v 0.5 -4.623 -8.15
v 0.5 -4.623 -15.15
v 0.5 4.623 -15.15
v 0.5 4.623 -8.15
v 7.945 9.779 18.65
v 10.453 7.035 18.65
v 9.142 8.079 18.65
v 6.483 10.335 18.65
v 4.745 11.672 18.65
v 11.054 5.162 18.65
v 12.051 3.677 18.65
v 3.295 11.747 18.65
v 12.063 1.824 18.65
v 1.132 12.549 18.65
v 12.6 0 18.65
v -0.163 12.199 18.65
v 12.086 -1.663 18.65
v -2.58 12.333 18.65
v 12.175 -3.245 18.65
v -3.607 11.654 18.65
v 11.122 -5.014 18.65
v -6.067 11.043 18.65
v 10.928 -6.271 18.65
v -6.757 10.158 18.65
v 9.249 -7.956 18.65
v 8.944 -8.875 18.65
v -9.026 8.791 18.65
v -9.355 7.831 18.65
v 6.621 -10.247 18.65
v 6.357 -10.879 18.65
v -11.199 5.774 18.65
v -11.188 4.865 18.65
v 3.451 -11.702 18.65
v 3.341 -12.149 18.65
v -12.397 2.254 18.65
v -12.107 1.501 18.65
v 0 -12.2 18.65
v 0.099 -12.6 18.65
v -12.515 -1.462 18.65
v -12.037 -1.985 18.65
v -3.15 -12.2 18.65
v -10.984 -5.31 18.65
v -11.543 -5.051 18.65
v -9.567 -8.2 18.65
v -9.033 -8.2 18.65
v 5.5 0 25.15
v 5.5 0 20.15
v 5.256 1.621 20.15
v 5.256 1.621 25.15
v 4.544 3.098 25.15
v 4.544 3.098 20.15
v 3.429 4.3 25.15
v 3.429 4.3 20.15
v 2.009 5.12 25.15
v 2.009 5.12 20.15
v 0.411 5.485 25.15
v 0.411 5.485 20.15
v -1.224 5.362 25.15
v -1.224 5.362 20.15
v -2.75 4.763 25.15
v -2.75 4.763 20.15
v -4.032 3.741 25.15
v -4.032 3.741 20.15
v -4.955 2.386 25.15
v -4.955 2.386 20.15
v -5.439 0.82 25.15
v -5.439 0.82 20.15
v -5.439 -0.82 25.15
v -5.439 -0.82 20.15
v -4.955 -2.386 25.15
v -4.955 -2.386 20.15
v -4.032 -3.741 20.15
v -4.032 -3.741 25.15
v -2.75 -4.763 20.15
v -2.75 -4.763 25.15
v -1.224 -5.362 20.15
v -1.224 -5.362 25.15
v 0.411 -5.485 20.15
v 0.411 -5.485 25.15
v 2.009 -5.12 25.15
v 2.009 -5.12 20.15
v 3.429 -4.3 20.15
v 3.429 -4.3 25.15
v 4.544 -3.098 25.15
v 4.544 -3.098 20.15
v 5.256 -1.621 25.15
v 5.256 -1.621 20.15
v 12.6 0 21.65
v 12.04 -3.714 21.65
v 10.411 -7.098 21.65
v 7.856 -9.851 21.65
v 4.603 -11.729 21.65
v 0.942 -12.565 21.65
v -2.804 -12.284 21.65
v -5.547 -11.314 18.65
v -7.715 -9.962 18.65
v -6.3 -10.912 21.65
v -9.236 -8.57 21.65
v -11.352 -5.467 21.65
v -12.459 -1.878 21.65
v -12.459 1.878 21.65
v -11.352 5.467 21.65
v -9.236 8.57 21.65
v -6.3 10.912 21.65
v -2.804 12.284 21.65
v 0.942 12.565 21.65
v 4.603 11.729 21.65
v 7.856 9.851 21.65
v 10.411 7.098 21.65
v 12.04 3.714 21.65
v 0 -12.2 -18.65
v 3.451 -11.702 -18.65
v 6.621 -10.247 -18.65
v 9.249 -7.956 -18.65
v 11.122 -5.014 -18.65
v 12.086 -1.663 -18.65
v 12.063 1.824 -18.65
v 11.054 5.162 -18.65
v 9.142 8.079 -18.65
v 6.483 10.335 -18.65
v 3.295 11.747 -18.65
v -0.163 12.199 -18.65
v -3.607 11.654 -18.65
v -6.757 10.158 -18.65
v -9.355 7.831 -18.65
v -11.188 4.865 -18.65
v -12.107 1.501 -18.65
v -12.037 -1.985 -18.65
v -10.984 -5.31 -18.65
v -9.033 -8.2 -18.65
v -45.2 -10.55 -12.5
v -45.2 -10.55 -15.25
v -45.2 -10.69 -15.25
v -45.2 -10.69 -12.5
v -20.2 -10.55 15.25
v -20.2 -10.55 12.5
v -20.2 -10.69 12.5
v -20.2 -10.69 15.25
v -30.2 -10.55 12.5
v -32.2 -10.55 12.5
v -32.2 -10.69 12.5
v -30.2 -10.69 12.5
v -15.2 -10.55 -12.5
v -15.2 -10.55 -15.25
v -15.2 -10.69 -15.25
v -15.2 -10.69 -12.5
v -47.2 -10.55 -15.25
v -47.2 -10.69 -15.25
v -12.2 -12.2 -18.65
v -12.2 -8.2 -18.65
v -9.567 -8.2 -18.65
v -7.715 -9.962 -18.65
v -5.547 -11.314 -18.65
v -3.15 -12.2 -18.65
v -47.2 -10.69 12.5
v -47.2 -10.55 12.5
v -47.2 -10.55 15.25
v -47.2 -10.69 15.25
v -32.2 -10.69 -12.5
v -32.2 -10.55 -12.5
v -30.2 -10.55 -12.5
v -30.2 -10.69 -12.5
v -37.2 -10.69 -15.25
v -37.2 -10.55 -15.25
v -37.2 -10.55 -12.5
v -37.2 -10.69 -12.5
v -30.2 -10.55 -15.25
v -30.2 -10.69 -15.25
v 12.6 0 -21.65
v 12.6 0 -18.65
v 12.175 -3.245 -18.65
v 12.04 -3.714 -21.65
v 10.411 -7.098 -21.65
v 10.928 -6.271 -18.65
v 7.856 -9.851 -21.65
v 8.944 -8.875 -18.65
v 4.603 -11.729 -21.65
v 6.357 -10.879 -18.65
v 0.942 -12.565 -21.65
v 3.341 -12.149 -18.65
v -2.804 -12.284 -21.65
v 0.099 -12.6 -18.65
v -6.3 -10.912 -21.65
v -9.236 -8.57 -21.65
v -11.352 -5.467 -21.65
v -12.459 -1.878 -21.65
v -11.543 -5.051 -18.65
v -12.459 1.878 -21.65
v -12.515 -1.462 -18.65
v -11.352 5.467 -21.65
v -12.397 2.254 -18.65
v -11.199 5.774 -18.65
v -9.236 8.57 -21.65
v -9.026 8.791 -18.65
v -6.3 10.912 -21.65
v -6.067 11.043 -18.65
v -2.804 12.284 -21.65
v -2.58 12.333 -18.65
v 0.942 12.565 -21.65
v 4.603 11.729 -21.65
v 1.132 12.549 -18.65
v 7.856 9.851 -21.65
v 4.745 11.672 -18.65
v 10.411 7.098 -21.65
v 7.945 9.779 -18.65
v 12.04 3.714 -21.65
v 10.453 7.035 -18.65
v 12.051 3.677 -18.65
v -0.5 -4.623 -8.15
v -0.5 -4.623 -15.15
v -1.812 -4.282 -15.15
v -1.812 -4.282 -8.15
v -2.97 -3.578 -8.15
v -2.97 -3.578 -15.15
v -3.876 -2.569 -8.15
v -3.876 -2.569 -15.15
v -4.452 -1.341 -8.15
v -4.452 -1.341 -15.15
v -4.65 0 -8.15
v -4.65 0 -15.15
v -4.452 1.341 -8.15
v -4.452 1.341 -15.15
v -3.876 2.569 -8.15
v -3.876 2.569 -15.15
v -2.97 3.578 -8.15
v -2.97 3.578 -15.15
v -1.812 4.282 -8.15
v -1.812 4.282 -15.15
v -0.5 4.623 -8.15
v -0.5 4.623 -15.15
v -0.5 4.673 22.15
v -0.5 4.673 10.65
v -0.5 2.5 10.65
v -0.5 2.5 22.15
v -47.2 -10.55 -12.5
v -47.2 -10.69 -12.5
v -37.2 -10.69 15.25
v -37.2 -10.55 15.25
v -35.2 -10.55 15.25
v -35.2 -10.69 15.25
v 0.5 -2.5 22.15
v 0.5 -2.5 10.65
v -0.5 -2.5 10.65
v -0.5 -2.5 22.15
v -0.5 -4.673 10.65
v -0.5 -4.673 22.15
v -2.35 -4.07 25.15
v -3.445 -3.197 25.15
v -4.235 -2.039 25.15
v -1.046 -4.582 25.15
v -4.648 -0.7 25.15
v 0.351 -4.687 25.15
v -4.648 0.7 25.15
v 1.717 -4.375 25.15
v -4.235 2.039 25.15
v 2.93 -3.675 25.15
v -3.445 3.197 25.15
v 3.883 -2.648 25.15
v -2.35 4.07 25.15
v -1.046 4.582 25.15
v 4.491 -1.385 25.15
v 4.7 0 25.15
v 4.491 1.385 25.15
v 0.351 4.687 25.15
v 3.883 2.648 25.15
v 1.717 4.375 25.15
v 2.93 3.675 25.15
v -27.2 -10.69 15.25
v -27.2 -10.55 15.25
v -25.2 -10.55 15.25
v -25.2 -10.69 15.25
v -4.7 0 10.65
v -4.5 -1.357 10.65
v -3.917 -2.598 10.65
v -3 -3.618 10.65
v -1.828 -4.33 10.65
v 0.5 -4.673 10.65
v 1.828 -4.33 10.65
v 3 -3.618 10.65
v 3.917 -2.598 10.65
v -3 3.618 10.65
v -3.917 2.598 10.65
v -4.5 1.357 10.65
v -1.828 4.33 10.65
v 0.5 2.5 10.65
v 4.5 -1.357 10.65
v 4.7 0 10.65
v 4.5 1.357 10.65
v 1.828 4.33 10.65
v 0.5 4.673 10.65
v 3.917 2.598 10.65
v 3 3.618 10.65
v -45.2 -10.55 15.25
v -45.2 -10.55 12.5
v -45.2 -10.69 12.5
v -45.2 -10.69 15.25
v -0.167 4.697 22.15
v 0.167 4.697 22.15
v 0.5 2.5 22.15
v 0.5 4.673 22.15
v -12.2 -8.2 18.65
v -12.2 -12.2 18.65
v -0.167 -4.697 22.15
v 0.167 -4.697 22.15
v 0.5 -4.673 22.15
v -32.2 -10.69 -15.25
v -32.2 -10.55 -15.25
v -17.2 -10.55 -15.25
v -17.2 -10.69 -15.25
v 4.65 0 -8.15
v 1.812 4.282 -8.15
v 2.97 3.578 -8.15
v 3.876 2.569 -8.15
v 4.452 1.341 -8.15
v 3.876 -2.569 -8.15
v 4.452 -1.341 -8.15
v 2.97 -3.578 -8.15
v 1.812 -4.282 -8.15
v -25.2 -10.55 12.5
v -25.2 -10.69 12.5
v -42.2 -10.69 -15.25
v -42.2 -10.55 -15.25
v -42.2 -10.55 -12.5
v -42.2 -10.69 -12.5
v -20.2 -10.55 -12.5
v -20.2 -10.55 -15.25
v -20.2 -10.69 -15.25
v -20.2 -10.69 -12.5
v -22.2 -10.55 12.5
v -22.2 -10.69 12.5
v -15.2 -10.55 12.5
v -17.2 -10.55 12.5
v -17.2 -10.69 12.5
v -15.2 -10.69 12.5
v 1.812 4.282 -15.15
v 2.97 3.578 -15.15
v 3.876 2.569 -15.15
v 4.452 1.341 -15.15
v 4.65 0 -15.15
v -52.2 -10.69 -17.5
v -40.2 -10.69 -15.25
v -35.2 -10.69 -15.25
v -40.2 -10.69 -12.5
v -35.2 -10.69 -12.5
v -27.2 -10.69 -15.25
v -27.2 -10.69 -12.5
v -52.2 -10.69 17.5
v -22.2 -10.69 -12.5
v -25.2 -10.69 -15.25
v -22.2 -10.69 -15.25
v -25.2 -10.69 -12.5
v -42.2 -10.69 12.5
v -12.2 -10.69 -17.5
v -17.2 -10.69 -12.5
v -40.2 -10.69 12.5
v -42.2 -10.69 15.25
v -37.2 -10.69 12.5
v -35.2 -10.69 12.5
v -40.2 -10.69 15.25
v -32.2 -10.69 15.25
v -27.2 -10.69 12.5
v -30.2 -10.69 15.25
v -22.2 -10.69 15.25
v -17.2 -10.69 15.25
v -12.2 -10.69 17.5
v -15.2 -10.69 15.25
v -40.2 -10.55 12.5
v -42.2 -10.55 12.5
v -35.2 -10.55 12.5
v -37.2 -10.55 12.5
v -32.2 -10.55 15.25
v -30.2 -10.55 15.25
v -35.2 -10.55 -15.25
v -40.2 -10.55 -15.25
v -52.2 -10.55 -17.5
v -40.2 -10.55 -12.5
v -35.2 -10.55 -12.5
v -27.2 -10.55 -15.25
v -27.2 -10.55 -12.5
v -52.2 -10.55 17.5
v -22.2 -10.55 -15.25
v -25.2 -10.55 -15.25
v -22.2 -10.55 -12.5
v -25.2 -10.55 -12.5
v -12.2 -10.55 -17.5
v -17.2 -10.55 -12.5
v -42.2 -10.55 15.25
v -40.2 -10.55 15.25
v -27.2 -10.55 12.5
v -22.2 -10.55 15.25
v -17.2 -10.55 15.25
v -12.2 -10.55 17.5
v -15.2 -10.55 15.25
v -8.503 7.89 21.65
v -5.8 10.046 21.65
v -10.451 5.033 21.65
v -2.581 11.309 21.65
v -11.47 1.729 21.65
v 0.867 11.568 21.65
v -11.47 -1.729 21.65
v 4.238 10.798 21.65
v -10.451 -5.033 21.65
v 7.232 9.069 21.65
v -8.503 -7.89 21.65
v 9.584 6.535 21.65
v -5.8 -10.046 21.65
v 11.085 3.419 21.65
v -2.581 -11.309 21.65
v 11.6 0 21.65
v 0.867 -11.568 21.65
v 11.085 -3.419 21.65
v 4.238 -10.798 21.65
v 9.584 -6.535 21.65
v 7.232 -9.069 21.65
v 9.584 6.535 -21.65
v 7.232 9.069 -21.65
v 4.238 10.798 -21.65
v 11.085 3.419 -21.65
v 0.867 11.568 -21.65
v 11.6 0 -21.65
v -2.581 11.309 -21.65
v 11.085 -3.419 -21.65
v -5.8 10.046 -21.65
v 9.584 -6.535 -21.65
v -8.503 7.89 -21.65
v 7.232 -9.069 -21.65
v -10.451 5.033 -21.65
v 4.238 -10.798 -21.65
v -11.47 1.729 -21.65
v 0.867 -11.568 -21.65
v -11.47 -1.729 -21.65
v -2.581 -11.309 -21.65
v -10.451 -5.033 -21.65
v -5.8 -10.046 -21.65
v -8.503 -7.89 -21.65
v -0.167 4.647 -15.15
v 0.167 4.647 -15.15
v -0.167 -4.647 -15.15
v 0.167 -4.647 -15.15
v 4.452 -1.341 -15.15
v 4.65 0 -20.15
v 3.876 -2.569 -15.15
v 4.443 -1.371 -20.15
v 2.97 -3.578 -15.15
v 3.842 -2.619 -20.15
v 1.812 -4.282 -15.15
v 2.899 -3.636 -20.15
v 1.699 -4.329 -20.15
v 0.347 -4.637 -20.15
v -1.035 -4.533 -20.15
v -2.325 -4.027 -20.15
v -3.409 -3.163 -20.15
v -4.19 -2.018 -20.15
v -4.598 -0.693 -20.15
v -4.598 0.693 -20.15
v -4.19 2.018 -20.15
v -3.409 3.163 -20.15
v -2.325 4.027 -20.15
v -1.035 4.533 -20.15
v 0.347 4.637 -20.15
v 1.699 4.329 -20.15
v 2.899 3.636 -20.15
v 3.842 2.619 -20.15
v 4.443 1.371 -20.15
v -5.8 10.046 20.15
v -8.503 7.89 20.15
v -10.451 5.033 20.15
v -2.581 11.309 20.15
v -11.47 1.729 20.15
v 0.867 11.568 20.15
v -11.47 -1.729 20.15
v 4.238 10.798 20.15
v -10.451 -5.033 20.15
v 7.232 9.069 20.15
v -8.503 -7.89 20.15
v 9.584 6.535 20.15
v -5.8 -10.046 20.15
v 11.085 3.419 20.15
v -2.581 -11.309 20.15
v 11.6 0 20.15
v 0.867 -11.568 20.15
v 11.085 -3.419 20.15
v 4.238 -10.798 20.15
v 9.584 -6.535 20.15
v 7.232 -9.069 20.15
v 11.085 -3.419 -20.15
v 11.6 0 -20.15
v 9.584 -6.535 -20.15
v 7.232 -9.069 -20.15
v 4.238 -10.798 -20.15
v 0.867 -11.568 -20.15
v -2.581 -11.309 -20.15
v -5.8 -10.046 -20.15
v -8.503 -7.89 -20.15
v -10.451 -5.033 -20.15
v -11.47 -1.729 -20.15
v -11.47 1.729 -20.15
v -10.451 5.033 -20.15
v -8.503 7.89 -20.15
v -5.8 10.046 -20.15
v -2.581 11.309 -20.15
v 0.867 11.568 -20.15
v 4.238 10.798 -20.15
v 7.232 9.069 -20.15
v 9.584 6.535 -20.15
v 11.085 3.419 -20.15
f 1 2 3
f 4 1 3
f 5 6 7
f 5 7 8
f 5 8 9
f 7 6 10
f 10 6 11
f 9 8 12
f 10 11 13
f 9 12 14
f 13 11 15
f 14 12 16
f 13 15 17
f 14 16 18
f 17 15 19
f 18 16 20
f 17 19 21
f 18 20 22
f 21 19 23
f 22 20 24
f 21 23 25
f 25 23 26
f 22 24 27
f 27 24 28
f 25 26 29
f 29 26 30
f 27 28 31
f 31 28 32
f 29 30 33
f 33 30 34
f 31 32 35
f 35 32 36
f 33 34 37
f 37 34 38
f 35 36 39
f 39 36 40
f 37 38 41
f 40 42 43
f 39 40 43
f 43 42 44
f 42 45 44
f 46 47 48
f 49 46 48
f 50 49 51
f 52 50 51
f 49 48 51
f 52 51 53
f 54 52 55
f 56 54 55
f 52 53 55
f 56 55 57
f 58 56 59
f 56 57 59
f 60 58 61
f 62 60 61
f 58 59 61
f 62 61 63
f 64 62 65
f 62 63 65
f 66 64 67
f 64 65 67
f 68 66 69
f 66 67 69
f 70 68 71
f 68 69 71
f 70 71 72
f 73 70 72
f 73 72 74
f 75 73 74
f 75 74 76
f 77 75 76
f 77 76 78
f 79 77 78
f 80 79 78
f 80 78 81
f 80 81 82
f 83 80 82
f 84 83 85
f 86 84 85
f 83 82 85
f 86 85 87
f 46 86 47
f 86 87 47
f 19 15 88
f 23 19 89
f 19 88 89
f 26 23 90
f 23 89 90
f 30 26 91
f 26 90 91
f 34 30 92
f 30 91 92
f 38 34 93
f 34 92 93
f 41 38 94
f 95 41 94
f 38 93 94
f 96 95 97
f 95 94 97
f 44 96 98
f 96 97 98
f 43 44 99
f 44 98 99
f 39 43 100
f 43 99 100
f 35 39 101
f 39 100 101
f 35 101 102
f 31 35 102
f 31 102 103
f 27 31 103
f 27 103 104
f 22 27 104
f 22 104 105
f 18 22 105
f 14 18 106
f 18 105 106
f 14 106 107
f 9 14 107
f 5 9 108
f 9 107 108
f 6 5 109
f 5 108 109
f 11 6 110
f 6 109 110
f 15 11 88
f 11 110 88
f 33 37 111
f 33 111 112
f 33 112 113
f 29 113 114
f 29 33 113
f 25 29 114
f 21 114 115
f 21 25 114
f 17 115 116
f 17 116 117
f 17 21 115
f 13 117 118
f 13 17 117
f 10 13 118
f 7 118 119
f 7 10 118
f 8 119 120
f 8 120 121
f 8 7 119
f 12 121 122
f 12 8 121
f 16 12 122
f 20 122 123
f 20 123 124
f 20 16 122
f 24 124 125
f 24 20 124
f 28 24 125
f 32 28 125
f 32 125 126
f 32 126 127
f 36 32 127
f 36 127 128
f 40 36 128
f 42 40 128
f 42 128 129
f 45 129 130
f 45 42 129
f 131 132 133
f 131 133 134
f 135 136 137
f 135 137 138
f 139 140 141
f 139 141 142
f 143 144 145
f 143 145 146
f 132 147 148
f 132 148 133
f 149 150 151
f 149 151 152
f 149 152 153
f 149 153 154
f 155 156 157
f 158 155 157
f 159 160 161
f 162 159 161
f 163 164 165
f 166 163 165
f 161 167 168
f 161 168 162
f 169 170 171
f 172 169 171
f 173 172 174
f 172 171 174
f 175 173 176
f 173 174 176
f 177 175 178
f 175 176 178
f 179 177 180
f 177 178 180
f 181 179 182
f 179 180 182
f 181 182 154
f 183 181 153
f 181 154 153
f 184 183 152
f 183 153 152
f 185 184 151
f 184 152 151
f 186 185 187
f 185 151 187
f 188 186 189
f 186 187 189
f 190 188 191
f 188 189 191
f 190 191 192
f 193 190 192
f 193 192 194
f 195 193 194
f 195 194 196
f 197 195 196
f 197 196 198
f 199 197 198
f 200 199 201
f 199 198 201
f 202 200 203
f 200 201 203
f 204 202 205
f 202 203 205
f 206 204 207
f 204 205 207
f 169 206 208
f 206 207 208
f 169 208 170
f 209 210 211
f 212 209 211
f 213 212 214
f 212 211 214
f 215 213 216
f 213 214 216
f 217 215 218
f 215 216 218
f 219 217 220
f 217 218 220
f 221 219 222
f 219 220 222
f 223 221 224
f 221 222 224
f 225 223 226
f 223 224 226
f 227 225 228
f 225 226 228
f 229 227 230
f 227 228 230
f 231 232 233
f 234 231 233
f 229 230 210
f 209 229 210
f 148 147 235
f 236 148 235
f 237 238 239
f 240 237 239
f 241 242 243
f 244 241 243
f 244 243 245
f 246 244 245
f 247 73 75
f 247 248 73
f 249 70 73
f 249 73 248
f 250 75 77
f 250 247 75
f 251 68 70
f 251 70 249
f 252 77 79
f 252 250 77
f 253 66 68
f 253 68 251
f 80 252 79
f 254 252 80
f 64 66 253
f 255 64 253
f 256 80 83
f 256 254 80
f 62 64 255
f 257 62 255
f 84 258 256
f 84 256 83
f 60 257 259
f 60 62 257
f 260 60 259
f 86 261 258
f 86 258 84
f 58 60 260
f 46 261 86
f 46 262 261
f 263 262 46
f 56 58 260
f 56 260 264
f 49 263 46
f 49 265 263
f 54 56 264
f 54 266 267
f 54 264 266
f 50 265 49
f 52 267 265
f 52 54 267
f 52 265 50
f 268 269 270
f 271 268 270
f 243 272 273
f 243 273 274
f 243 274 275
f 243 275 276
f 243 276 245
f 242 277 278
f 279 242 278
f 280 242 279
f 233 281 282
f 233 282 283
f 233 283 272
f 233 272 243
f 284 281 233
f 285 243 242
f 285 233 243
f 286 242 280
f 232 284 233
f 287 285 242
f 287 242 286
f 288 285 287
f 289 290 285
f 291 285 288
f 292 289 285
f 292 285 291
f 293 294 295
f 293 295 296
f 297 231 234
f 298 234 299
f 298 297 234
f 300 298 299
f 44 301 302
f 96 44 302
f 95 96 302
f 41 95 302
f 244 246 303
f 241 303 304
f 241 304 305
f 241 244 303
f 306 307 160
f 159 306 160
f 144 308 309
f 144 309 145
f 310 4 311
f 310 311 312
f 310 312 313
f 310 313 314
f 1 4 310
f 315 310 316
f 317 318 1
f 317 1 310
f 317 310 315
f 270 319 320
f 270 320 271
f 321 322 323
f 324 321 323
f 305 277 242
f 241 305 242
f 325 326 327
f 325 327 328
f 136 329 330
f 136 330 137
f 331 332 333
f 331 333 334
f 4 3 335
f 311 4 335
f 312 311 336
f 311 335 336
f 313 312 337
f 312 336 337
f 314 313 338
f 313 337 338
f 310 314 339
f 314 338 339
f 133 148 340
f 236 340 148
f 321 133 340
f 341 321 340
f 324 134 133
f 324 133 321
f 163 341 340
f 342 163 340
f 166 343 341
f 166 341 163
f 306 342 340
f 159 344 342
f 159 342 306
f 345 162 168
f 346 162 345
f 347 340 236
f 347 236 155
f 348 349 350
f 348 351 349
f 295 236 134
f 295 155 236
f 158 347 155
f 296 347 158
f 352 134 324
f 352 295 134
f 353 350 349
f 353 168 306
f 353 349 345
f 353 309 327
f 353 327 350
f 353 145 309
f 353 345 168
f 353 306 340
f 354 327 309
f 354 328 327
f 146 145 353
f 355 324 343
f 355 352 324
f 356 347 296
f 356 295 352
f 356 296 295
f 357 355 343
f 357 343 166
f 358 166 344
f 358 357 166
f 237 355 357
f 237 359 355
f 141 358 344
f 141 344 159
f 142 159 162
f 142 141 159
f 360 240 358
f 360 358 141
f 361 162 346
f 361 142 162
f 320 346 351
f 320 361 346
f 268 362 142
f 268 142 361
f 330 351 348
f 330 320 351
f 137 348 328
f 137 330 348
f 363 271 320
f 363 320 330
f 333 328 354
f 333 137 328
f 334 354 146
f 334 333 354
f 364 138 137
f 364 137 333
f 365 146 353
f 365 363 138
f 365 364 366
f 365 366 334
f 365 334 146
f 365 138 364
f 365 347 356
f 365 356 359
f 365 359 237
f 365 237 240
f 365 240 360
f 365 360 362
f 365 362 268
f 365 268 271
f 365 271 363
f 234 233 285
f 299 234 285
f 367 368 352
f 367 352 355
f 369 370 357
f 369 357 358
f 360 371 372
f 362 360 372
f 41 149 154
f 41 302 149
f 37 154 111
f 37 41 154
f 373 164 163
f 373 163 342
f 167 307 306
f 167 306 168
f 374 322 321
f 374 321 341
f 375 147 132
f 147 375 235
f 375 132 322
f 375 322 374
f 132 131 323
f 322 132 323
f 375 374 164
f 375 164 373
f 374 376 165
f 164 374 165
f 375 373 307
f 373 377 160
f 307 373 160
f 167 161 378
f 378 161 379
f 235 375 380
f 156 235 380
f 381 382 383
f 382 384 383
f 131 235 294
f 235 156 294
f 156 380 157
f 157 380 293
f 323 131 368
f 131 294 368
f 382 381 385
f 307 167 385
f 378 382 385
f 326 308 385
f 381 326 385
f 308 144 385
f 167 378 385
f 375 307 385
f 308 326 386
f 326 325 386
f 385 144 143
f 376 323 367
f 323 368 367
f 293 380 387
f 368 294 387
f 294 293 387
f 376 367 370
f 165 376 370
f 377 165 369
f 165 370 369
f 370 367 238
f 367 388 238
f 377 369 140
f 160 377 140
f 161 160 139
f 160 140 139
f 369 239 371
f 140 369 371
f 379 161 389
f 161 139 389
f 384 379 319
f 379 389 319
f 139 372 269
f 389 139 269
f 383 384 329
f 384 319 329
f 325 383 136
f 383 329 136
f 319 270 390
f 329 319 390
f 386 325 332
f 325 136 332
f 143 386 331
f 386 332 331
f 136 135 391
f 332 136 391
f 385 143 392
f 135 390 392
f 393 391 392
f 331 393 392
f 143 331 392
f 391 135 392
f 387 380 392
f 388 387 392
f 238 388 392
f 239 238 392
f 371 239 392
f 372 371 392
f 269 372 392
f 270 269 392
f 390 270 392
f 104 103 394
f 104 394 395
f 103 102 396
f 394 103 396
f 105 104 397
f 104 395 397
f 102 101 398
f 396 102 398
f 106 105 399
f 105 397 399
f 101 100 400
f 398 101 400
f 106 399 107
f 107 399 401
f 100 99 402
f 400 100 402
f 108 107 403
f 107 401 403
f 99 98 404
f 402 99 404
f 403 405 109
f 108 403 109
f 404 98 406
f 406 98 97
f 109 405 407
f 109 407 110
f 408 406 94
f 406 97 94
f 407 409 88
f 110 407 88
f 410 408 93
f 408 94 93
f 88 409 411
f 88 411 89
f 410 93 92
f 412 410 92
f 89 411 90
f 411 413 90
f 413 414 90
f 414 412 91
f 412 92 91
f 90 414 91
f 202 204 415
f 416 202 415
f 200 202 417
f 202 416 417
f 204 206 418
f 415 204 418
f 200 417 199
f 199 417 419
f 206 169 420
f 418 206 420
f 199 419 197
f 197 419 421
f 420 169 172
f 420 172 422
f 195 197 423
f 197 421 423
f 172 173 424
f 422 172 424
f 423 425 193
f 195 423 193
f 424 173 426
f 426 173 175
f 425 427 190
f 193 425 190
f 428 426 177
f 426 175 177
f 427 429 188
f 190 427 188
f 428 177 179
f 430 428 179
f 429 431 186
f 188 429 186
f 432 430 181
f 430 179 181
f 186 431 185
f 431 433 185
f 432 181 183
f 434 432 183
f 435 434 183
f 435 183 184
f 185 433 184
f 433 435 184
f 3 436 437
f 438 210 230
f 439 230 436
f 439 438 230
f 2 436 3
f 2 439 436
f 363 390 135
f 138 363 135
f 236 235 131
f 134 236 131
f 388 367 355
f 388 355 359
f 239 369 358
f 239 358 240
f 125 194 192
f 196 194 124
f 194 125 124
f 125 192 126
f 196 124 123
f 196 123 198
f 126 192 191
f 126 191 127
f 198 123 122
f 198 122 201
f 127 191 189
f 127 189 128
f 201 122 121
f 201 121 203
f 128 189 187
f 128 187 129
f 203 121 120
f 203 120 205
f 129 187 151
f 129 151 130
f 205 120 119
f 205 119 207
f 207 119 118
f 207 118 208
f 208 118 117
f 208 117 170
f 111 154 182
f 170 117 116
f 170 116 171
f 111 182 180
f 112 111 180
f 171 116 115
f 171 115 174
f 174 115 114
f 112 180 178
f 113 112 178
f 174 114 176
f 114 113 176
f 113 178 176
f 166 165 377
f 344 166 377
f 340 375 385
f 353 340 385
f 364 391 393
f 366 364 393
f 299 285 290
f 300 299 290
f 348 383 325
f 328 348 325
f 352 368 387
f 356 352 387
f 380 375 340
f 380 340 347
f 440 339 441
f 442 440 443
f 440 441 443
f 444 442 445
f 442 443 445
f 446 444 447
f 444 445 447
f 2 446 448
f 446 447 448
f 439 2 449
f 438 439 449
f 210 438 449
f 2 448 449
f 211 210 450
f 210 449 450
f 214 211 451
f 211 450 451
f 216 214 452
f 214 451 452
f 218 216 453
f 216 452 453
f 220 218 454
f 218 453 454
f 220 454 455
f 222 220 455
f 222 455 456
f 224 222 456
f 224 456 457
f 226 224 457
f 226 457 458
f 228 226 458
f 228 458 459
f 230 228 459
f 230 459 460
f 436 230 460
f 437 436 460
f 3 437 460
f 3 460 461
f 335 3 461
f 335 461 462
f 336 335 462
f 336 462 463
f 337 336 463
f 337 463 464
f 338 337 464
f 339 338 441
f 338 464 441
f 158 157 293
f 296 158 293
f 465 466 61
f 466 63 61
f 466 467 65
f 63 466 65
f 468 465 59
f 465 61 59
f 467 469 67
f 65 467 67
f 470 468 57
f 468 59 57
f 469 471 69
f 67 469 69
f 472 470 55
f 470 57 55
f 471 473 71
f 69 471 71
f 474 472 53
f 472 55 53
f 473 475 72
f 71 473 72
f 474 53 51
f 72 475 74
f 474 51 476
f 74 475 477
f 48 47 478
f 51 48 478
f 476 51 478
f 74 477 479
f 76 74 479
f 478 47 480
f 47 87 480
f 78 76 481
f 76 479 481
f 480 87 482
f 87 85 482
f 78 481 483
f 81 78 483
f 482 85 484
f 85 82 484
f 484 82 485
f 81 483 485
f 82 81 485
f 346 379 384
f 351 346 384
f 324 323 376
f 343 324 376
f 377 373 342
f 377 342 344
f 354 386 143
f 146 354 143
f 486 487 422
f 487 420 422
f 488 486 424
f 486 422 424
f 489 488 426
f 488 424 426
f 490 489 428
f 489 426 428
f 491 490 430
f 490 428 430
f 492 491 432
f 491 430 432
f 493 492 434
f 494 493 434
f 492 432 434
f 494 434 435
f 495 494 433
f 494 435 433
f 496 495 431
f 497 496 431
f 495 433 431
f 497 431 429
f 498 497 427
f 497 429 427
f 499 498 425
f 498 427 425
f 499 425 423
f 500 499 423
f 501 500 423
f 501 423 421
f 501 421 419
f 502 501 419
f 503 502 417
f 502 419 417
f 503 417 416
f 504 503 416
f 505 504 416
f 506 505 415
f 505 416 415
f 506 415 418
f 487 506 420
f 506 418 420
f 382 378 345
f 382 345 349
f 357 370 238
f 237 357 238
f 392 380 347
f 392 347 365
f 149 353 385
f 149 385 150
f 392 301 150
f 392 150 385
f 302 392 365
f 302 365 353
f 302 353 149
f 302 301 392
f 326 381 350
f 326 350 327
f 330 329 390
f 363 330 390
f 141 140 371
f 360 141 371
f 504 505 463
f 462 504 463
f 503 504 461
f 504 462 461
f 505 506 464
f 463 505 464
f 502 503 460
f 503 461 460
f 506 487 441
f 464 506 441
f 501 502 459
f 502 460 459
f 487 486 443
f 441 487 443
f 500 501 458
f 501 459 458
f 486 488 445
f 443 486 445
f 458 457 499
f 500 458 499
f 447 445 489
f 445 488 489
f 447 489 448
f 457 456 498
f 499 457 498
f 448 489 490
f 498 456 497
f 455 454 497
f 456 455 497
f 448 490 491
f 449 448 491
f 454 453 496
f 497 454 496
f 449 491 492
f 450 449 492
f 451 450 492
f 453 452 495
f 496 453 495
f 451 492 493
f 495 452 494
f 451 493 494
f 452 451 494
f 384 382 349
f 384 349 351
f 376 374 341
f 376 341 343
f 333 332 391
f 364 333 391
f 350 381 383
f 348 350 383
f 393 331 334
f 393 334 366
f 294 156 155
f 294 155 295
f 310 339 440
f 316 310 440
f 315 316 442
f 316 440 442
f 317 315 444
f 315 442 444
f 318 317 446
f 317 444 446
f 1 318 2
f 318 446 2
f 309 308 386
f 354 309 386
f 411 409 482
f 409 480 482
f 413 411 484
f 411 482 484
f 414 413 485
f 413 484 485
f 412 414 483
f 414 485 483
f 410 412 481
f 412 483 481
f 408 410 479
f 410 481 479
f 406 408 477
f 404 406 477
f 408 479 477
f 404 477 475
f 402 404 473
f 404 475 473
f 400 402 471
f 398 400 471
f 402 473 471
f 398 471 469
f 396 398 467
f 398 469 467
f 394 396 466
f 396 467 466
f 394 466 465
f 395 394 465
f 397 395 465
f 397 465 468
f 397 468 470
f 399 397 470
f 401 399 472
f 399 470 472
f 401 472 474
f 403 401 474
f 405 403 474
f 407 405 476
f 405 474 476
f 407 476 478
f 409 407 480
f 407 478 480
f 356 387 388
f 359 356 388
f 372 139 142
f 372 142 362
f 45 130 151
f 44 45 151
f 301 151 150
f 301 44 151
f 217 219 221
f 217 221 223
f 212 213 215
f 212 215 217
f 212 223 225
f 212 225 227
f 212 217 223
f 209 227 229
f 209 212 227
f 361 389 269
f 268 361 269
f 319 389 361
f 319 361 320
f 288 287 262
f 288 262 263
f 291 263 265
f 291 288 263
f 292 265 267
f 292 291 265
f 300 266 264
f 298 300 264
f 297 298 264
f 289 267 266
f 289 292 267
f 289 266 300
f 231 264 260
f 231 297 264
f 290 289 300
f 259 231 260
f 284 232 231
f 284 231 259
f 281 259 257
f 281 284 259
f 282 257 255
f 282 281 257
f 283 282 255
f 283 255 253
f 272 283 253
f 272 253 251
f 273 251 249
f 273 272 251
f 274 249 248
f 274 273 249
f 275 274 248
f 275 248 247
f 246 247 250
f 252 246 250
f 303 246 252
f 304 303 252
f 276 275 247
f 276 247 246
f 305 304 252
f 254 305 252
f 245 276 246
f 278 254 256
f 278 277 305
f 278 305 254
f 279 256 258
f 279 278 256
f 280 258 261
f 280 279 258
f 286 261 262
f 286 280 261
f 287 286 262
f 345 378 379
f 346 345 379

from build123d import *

# Parameters (mm, degrees)
F1_DEPTH  = 18.65
F4_R      = 4.65
F5_DEPTH  = 5
F7_DEPTH  = 7
F10_R     = 5.5
F10_R_2   = 4.7
F11_DEPTH = 5
F12_R     = 4.7
F13_DEPTH = 9.5
F15_DEPTH = 11.5
F17_W     = 40
F17_H     = 35
F17_W_2   = 2
F17_H_2   = 2.75
F18_DEPTH = 0.14


with BuildPart() as f1:
    # F0 (on Top) → F1 (new body, symmetric)
    with BuildSketch(Plane.XY):
        with BuildLine():
            Line((-12.2, -12.2), (0, -12.2))
            ThreePointArc((0, -12.2), (4.9396356141, 11.1552678139), (-9.0332718325, -8.2))
            Line((-9.0332718325, -8.2), (-12.2, -8.2))
            Line((-12.2, -8.2), (-12.2, -12.2))
        make_face()
    extrude(amount=F1_DEPTH, both=True)

    # F2 (on Front) → F3 (revolve)
    with BuildSketch(Plane.XZ):
        Polygon((12.6, -18.65), (0, -18.65), (0, -20.15), (11.6, -20.15), (11.6, -21.65), (12.6, -21.65), align=None)
    revolve(axis=Axis((0, 0, -19.4), (0, 0, -1)))

    # F4 (on face) → F5 (cut)
    with BuildSketch(Plane(origin=(0, 0, -20.15), x_dir=(1, 0, 0), z_dir=(0, 0, -1))):
        Circle(F4_R)
    extrude(amount=-F5_DEPTH, mode=Mode.SUBTRACT)

    # F6 (on face) → F7 (cut)
    with BuildSketch(Plane(origin=(0, 0, -15.15), x_dir=(1, 0, 0), z_dir=(0, 0, -1))):
        with BuildLine():
            Line((-0.5, -4.6230401253), (-0.5, 4.6230401253))
            ThreePointArc((-0.5, 4.6230401253), (-4.65, 0), (-0.5, -4.6230401253))
        make_face()
        with BuildLine():
            ThreePointArc((4.65, 0), (3.4603106797, 3.1062437123), (0.5, 4.6230401253))
            Line((0.5, 4.6230401253), (0.5, -4.6230401253))
            ThreePointArc((0.5, -4.6230401253), (3.4603106797, -3.1062437123), (4.65, 0))
        make_face()
    extrude(amount=-F7_DEPTH, mode=Mode.SUBTRACT)

    # F8 (on Front) → F9 (revolve)
    with BuildSketch(Plane.XZ):
        Polygon((0, 20.15), (0, 18.65), (12.6, 18.65), (12.6, 21.65), (11.6, 21.65), (11.6, 20.15), align=None)
    revolve(axis=Axis((0, 0, 19.4), (0, 0, -1)))

    # F10 (on face) → F11 (join)
    with BuildSketch(Plane.XY.offset(20.15)):
        Circle(F10_R)
        Circle(F10_R_2, mode=Mode.SUBTRACT)
    extrude(amount=F11_DEPTH)

    # F12 (on face) → F13 (cut)
    with BuildSketch(Plane.XY.offset(20.15)):
        Circle(F12_R)
    extrude(amount=-F13_DEPTH, mode=Mode.SUBTRACT)

    # F14 (on face) → F15 (join)
    with BuildSketch(Plane.XY.offset(10.65)):
        with BuildLine():
            ThreePointArc((0.5, 4.6733285782), (0, 4.7), (-0.5, 4.6733285782))
            Line((-0.5, 4.6733285782), (-0.5, 2.5))
            Line((-0.5, 2.5), (0.5, 2.5))
            Line((0.5, 2.5), (0.5, 4.6733285782))
        make_face()
        with BuildLine():
            ThreePointArc((-0.5, -4.6733285782), (0, -4.7), (0.5, -4.6733285782))
            Line((0.5, -4.6733285782), (0.5, -2.5))
            Line((0.5, -2.5), (-0.5, -2.5))
            Line((-0.5, -2.5), (-0.5, -4.6733285782))
        make_face()
    extrude(amount=F15_DEPTH)

    # F17 (on offset) → F18 (join)
    with BuildSketch(Plane.XZ.offset(10.55)):
        with Locations((-32.2, 0)):
            Rectangle(F17_W, F17_H)
        with Locations((-46.2, -13.875)):
            Rectangle(F17_W_2, F17_H_2, mode=Mode.SUBTRACT)
        with Locations((-41.2, -13.875)):
            Rectangle(F17_W_2, F17_H_2, mode=Mode.SUBTRACT)
        with Locations((-36.2, -13.875)):
            Rectangle(F17_W_2, F17_H_2, mode=Mode.SUBTRACT)
        with Locations((-31.2, -13.875)):
            Rectangle(F17_W_2, F17_H_2, mode=Mode.SUBTRACT)
        with Locations((-26.2, -13.875)):
            Rectangle(F17_W_2, F17_H_2, mode=Mode.SUBTRACT)
        with Locations((-21.2, -13.875)):
            Rectangle(F17_W_2, F17_H_2, mode=Mode.SUBTRACT)
        with Locations((-16.2, -13.875)):
            Rectangle(F17_W_2, F17_H_2, mode=Mode.SUBTRACT)
        with Locations((-46.2, 13.875)):
            Rectangle(F17_W_2, F17_H_2, mode=Mode.SUBTRACT)
        with Locations((-41.2, 13.875)):
            Rectangle(F17_W_2, F17_H_2, mode=Mode.SUBTRACT)
        with Locations((-36.2, 13.875)):
            Rectangle(F17_W_2, F17_H_2, mode=Mode.SUBTRACT)
        with Locations((-31.2, 13.875)):
            Rectangle(F17_W_2, F17_H_2, mode=Mode.SUBTRACT)
        with Locations((-26.2, 13.875)):
            Rectangle(F17_W_2, F17_H_2, mode=Mode.SUBTRACT)
        with Locations((-21.2, 13.875)):
            Rectangle(F17_W_2, F17_H_2, mode=Mode.SUBTRACT)
        with Locations((-16.2, 13.875)):
            Rectangle(F17_W_2, F17_H_2, mode=Mode.SUBTRACT)
    extrude(amount=F18_DEPTH)


solid = f1.part
